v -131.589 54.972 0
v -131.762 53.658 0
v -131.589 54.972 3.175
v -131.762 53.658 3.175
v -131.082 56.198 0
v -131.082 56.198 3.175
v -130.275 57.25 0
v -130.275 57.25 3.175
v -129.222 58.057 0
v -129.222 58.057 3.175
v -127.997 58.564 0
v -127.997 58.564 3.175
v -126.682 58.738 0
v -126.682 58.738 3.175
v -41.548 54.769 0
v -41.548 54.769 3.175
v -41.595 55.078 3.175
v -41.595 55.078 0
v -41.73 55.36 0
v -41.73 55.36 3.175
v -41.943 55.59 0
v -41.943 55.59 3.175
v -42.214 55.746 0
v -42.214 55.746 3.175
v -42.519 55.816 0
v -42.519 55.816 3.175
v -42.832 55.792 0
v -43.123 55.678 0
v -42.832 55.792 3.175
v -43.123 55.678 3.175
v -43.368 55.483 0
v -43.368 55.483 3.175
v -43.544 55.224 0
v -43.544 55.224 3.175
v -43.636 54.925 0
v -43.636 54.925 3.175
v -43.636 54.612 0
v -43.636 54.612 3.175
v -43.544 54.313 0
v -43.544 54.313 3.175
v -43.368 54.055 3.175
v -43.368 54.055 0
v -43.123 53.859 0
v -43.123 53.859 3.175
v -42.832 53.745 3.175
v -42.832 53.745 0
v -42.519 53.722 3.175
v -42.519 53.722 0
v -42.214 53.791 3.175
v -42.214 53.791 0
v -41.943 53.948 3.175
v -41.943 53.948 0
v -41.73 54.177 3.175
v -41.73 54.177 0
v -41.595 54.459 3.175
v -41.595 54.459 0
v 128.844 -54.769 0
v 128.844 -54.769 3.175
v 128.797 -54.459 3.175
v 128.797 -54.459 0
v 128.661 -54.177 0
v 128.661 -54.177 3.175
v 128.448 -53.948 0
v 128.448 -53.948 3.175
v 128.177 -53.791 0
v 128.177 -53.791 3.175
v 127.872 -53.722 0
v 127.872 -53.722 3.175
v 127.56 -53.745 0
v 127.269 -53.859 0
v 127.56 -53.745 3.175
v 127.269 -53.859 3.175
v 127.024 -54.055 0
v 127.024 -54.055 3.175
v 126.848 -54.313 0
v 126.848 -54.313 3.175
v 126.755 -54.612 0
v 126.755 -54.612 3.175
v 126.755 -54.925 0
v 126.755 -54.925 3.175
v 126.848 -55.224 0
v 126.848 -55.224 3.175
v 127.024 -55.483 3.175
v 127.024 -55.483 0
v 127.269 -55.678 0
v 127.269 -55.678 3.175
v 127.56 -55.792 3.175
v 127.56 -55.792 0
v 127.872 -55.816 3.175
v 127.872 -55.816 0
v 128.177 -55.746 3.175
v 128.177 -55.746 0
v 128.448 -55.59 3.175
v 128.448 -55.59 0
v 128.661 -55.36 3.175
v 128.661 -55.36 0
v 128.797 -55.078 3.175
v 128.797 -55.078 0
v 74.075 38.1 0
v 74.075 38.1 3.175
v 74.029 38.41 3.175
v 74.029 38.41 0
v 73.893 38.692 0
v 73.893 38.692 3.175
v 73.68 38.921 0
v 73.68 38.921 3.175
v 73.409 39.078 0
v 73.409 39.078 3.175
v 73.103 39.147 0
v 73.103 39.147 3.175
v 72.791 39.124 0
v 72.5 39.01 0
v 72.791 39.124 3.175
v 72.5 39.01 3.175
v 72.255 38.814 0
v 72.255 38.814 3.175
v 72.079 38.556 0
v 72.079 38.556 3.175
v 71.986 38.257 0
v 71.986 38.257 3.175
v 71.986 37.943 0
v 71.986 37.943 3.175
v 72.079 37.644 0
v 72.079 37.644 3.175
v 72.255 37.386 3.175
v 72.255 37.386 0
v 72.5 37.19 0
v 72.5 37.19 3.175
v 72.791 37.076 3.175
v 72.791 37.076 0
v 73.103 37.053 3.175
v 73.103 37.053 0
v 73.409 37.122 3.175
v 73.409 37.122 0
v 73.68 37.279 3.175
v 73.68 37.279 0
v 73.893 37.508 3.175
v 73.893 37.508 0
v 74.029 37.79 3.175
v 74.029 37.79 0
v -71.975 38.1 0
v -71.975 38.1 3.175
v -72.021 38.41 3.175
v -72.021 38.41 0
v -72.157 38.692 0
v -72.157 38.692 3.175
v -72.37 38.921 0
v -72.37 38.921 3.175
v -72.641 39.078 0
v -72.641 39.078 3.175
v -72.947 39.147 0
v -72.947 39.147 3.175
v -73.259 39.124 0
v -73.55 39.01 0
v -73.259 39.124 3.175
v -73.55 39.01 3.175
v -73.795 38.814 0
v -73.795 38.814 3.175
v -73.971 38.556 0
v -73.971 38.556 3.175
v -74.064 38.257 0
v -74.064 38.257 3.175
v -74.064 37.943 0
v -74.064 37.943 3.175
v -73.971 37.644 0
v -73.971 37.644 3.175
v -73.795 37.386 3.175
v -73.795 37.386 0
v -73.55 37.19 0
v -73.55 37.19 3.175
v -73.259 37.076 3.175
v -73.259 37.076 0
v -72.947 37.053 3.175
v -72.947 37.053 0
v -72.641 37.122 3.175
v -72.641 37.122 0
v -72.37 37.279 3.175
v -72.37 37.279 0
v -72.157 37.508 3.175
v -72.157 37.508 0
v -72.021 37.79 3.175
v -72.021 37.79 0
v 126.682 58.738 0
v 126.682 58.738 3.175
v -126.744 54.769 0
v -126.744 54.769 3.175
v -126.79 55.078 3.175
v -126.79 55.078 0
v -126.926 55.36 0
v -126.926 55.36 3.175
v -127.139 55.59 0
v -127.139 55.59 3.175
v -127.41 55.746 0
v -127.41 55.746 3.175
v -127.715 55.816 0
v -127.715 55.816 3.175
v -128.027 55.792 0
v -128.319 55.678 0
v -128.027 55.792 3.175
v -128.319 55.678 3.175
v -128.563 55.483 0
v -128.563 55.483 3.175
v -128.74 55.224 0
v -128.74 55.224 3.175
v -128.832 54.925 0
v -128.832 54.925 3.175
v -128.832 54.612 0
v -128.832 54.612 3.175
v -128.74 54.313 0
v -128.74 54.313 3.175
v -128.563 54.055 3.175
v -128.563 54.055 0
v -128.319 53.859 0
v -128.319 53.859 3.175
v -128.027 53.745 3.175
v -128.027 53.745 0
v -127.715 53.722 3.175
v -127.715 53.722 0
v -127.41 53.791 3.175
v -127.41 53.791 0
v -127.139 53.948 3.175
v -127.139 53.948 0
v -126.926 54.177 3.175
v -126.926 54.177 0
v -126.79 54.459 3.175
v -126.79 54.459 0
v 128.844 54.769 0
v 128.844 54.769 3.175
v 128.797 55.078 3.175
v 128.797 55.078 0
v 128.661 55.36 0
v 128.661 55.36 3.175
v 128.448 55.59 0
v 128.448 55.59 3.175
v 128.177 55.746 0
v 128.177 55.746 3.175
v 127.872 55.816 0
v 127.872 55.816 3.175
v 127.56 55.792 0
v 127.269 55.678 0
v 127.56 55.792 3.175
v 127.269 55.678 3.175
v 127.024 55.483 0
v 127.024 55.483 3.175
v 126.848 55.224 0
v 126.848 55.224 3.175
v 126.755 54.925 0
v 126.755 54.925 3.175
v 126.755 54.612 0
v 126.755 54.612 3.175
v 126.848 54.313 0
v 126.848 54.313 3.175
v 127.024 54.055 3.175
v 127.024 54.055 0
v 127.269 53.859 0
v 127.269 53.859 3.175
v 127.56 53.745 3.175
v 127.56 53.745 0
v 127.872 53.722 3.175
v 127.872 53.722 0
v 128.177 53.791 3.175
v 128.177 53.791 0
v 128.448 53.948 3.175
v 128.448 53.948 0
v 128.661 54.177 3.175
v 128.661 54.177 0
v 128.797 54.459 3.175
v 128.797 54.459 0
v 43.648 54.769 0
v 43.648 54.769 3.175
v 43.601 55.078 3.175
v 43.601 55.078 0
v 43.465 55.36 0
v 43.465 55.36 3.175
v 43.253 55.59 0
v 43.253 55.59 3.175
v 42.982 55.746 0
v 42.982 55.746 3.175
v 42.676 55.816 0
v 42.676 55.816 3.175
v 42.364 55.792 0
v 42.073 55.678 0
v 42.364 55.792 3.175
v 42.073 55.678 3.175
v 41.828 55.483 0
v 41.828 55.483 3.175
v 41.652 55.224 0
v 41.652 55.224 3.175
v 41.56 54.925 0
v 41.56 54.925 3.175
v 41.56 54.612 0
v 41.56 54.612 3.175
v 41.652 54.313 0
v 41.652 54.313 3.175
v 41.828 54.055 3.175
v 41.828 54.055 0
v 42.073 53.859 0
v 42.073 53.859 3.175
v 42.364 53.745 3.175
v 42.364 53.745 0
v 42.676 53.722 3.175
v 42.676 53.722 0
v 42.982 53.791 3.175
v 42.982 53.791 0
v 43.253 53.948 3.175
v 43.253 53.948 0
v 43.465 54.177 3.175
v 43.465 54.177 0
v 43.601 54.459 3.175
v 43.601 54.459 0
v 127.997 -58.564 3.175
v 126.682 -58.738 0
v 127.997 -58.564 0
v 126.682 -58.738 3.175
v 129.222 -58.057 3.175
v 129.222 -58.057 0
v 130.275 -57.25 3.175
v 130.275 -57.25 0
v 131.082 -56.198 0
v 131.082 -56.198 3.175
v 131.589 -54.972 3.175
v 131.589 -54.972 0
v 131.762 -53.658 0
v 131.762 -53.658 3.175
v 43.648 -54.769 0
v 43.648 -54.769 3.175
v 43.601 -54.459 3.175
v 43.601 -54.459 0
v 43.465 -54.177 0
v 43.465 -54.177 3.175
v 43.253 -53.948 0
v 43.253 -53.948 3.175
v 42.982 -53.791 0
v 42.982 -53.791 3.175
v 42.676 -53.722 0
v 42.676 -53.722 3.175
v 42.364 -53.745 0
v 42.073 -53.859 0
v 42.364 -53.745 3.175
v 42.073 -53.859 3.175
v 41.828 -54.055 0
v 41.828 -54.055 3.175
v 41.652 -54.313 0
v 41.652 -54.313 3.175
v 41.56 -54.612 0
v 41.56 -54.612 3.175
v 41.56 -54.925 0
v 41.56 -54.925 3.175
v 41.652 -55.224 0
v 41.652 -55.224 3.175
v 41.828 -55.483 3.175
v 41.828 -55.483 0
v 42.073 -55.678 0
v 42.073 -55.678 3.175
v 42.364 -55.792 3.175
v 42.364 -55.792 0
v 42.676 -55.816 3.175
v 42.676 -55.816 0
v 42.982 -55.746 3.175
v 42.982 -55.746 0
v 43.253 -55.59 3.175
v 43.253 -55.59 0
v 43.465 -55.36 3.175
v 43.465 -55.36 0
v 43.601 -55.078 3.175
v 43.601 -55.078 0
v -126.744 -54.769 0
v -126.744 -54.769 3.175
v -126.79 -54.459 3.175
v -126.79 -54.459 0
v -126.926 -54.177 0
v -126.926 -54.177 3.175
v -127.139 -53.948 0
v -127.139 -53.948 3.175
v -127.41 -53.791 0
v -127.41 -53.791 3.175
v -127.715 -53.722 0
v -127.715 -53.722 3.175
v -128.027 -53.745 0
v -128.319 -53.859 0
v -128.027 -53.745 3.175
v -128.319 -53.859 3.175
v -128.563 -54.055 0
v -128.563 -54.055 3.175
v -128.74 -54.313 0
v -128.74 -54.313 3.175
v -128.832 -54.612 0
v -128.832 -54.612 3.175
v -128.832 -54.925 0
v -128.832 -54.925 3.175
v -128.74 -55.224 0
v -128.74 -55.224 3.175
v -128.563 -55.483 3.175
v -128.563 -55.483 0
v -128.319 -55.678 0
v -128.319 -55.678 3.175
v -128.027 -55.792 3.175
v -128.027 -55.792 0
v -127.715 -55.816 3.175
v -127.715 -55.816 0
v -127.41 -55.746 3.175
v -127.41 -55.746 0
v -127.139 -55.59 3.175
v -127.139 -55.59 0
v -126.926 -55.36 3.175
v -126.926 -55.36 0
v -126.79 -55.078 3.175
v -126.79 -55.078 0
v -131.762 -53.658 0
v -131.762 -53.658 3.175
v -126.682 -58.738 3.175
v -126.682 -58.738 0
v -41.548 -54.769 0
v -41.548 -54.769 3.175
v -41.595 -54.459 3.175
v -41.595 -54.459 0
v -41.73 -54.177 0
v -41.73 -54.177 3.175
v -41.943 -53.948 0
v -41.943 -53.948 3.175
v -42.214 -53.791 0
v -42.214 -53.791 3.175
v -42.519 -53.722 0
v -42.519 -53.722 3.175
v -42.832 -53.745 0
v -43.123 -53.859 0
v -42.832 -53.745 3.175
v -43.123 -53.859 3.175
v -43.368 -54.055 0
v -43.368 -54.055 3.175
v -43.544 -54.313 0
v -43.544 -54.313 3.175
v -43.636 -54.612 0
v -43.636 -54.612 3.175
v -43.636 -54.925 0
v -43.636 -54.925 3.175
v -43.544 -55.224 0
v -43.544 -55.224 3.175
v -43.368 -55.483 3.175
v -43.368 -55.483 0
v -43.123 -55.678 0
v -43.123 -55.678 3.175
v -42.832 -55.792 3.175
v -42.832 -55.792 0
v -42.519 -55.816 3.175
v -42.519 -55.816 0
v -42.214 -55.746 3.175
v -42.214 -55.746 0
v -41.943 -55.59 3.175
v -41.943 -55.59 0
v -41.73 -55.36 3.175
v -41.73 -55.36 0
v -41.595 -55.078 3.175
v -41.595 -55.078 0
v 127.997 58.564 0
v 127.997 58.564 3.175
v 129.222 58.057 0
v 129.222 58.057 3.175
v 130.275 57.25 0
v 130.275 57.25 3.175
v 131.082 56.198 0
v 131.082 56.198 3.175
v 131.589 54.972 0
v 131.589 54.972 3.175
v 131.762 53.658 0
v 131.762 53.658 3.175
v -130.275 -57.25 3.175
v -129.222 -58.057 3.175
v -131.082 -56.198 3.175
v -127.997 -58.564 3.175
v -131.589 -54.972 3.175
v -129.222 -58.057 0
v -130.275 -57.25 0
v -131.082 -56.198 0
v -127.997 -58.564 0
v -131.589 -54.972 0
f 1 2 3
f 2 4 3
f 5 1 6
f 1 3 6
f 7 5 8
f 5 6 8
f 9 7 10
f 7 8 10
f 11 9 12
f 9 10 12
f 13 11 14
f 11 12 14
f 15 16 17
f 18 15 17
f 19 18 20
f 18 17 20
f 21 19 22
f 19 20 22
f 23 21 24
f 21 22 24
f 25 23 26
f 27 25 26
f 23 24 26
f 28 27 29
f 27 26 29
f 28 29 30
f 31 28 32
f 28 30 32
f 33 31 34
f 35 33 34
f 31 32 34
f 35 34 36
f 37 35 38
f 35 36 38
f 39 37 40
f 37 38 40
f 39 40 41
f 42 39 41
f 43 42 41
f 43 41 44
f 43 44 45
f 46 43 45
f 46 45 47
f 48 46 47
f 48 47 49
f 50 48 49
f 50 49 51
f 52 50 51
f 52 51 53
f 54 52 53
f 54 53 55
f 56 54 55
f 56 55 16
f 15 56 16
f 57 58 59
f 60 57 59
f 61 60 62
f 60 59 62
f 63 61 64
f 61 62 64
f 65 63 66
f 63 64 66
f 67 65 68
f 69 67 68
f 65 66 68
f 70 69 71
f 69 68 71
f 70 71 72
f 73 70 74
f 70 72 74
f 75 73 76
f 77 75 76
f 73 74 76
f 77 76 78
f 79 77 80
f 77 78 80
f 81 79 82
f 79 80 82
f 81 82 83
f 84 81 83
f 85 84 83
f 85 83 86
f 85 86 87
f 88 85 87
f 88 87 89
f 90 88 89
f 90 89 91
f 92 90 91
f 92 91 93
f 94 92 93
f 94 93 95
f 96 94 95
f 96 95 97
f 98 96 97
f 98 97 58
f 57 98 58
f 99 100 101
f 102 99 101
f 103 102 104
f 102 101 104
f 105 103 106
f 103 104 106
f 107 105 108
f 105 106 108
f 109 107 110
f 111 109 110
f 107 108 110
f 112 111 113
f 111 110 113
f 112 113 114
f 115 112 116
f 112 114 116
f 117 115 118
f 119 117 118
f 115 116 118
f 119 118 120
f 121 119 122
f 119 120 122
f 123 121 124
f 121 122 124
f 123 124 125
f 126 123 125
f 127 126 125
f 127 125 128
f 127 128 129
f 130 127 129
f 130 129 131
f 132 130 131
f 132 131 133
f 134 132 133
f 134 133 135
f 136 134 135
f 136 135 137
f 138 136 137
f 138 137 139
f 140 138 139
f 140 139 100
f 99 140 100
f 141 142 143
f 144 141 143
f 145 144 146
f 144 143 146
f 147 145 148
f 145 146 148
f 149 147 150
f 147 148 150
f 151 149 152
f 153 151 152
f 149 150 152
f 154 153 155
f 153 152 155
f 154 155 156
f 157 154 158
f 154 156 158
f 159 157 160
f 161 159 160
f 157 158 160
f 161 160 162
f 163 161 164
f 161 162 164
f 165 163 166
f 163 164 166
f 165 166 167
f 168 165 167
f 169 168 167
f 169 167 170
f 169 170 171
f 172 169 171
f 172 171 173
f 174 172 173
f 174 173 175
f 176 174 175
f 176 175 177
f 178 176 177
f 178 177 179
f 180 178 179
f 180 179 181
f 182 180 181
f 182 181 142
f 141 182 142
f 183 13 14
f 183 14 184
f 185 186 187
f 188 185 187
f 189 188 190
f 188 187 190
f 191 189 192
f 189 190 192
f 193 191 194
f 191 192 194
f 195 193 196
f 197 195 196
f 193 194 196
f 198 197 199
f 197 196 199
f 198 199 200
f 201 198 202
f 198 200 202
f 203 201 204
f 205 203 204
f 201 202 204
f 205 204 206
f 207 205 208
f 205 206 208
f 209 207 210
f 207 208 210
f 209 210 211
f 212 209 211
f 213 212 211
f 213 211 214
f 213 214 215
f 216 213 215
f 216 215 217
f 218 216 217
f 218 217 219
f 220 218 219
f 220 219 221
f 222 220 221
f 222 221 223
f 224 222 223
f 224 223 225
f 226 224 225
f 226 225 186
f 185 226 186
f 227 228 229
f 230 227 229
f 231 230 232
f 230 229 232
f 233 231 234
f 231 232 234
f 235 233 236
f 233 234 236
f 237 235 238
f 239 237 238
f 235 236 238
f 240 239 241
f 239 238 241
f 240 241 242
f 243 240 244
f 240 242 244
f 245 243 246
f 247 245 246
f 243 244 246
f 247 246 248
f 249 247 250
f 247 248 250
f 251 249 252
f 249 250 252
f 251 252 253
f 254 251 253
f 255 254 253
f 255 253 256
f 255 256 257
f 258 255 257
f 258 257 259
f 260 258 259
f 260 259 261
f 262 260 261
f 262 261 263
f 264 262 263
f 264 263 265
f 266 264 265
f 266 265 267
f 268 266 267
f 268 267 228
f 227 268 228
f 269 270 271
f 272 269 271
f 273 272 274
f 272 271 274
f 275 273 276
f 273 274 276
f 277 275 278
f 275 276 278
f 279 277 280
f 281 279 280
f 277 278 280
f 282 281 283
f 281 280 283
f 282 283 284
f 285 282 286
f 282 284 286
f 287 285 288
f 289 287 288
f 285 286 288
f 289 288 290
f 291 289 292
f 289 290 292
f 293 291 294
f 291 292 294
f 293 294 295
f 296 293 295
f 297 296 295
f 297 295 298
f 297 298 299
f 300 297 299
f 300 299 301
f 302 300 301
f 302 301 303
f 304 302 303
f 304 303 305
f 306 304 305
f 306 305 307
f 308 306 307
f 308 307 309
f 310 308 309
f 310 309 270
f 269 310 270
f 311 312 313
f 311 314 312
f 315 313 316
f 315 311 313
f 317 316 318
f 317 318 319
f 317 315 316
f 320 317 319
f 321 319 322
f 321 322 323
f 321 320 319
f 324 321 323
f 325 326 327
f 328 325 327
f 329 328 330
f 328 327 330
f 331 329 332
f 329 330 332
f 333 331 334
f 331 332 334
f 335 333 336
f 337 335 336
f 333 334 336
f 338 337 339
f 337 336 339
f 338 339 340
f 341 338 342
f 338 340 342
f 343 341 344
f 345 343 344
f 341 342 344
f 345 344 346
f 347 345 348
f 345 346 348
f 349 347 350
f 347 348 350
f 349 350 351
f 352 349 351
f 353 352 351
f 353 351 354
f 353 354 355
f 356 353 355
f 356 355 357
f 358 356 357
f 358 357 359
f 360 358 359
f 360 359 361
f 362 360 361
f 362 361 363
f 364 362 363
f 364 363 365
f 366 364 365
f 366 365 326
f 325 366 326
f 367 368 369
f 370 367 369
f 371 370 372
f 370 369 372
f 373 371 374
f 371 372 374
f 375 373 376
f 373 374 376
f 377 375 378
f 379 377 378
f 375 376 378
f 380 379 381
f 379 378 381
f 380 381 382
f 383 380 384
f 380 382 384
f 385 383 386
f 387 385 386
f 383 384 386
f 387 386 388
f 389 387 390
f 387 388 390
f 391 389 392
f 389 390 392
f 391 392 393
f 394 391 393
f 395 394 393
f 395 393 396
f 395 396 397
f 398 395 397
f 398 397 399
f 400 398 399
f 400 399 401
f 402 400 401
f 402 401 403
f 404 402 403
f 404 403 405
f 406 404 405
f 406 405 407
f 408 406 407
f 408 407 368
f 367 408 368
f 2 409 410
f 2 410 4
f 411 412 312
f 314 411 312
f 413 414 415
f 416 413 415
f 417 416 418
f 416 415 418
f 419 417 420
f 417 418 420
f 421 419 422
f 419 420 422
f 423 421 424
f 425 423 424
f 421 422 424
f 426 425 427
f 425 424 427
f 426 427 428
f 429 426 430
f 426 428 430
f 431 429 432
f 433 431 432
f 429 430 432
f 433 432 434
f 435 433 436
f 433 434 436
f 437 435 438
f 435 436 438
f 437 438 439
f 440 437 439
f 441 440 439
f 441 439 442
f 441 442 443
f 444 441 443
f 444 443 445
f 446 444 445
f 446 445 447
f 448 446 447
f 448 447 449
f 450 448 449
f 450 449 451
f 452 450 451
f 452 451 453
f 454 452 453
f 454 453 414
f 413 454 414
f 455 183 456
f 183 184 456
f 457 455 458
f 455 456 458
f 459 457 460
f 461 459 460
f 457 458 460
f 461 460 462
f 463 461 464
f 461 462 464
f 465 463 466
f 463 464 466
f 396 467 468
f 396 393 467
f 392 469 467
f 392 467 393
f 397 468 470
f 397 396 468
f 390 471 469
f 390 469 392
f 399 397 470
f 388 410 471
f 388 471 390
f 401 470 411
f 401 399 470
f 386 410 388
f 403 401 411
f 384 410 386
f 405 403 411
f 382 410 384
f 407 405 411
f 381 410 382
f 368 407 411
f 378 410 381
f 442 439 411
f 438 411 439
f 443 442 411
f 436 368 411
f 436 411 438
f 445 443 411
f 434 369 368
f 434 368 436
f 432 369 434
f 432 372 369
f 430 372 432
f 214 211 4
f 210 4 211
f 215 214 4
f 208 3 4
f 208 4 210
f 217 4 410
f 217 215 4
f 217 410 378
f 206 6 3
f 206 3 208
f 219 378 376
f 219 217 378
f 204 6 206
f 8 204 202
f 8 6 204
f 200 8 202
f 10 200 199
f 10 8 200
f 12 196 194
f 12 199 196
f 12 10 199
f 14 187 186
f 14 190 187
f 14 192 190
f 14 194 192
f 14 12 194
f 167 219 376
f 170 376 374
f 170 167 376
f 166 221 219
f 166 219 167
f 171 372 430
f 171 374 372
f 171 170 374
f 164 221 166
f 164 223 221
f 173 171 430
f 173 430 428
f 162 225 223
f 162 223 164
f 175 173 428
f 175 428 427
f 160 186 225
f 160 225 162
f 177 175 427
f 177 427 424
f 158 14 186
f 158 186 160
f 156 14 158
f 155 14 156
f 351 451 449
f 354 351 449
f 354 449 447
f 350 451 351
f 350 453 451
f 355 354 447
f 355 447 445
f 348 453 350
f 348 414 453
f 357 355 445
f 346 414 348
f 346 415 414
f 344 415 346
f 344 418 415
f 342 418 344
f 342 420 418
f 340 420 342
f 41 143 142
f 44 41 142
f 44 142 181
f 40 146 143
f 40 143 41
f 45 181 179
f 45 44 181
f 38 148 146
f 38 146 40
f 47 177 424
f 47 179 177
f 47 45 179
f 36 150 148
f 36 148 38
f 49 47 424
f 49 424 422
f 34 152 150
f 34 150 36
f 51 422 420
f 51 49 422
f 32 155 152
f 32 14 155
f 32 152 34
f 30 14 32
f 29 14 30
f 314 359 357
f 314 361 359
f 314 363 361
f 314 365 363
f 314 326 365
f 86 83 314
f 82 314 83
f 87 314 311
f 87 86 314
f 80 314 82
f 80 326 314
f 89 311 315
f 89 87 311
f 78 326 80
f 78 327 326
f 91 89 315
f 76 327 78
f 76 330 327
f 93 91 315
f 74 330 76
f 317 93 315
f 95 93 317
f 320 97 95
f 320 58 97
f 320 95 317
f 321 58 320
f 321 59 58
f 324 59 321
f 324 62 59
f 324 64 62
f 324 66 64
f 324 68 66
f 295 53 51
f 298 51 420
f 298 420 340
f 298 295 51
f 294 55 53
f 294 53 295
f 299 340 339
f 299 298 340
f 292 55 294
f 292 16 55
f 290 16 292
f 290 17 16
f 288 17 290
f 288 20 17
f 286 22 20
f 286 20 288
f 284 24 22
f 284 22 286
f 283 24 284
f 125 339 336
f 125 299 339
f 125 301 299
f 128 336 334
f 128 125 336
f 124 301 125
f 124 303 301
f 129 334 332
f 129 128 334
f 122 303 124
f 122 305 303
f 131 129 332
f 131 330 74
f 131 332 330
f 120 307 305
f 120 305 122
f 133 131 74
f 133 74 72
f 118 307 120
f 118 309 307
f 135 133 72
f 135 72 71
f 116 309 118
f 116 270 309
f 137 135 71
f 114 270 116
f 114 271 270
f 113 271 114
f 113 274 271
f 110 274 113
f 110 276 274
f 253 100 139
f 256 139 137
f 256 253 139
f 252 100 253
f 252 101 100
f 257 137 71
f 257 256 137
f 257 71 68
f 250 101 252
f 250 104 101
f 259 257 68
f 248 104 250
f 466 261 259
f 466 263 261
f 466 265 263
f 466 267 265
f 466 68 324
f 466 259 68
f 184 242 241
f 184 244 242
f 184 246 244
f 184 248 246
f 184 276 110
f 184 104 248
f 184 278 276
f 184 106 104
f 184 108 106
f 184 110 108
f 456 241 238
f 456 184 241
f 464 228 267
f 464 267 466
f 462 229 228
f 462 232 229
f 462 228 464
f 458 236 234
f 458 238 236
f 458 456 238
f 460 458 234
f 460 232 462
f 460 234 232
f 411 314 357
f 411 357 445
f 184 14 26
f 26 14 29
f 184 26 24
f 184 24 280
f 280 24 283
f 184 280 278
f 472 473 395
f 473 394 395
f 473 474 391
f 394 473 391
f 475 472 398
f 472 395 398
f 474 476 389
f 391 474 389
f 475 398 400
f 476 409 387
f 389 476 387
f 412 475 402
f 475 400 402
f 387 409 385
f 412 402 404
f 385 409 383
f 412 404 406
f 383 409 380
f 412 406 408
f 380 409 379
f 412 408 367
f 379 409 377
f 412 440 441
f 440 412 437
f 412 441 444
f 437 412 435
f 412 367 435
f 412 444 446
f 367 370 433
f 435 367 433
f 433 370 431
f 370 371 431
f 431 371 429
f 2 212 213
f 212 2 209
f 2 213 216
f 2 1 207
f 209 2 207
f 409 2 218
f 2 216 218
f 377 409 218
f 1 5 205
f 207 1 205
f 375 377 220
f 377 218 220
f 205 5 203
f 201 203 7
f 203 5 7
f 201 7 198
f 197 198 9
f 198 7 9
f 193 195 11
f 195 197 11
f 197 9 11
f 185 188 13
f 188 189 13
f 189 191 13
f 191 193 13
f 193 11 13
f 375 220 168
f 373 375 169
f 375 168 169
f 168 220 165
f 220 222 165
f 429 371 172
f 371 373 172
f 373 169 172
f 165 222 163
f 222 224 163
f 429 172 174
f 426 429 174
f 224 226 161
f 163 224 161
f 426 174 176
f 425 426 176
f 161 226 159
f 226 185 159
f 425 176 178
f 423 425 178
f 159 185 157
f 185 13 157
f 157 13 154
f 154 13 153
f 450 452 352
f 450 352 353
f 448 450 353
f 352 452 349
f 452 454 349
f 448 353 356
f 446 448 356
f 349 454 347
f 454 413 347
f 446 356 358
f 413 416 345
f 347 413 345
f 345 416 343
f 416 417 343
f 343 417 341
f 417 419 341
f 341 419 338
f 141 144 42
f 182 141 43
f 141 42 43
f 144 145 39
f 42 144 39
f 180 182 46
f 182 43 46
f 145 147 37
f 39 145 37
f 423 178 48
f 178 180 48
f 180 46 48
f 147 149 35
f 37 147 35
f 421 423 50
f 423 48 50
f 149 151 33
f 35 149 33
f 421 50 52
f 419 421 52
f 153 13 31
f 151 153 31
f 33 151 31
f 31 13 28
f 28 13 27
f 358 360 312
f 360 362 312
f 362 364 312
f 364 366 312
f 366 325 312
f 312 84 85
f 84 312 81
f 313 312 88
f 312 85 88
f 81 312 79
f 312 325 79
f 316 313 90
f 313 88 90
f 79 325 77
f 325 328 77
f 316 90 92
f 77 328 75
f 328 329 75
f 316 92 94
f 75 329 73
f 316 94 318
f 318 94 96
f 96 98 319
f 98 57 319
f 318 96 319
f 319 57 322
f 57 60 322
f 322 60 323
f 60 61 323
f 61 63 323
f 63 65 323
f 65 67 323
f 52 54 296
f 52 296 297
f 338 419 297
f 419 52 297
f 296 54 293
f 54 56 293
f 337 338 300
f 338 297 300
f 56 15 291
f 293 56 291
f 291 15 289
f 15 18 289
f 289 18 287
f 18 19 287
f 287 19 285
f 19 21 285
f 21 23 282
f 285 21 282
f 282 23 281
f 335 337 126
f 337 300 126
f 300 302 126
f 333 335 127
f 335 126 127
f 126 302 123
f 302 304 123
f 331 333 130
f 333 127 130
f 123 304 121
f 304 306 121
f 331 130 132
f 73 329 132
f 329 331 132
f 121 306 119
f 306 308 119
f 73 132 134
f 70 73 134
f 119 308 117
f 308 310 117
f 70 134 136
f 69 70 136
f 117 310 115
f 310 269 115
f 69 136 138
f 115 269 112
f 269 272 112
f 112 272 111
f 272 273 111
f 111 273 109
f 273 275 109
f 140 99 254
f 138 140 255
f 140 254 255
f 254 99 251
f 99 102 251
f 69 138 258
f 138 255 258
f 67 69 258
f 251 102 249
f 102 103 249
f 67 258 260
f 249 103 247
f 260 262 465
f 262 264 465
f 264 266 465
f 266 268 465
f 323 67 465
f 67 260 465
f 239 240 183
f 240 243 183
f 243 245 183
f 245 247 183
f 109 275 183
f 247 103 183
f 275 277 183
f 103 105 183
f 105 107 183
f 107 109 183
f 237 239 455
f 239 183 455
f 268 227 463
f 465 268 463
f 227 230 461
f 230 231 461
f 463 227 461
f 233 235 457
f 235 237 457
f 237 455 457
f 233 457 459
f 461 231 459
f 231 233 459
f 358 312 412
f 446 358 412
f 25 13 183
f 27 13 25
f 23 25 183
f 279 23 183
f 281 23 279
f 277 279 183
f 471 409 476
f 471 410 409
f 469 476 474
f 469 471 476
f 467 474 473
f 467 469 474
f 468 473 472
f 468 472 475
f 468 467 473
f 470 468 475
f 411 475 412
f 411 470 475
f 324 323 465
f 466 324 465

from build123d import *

# Parameters (mm, degrees)
SKETCH_W      = 263.525
SKETCH_H      = 117.475
PAD_DEPTH     = 3.175
SKETCH001_R   = 1.05
HOLE_DEPTH    = 3.176
SKETCH002_R   = 1.05029
HOLE001_DEPTH = 3.176
FILLET_R      = 5.08


with BuildPart() as part:
    # Sketch → Pad (new body)
    with BuildSketch(Plane.XY):
        Rectangle(SKETCH_W, SKETCH_H)
    extrude(amount=PAD_DEPTH)

    # Sketch001 (on Face6 of Pad) → Hole (cut, through all)
    with BuildSketch(Plane.XY.offset(3.175)):
        with Locations((-42.597917, 54.76875)):
            Circle(SKETCH001_R)
        with Locations((42.597917, 54.76875)):
            Circle(SKETCH001_R)
        with Locations((42.597917, -54.76875)):
            Circle(SKETCH001_R)
        with Locations((-42.597917, -54.76875)):
            Circle(SKETCH001_R)
        with Locations((-127.79375, -54.76875)):
            Circle(SKETCH001_R)
        with Locations((-127.79375, 54.76875)):
            Circle(SKETCH001_R)
        with Locations((127.79375, 54.76875)):
            Circle(SKETCH001_R)
        with Locations((127.79375, -54.76875)):
            Circle(SKETCH001_R)
    extrude(amount=-HOLE_DEPTH, mode=Mode.SUBTRACT)

    # Sketch002 (on Face5 of Hole) → Hole001 (cut, through all)
    with BuildSketch(Plane.XY.offset(3.175)):
        with Locations((-73.025, 38.1)):
            Circle(SKETCH002_R)
        with Locations((73.025, 38.1)):
            Circle(SKETCH002_R)
    extrude(amount=-HOLE001_DEPTH, mode=Mode.SUBTRACT)

    # Fillet
    fillet_edges = [part.edges().sort_by_distance(p)[0] for p in [
        (-131.7625, 58.7375, 1.5875),
        (-131.7625, -58.7375, 1.5875),
        (131.7625, 58.7375, 1.5875),
        (131.7625, -58.7375, 1.5875),
    ]]
    fillet(fillet_edges, radius=FILLET_R)


solid = part.part
